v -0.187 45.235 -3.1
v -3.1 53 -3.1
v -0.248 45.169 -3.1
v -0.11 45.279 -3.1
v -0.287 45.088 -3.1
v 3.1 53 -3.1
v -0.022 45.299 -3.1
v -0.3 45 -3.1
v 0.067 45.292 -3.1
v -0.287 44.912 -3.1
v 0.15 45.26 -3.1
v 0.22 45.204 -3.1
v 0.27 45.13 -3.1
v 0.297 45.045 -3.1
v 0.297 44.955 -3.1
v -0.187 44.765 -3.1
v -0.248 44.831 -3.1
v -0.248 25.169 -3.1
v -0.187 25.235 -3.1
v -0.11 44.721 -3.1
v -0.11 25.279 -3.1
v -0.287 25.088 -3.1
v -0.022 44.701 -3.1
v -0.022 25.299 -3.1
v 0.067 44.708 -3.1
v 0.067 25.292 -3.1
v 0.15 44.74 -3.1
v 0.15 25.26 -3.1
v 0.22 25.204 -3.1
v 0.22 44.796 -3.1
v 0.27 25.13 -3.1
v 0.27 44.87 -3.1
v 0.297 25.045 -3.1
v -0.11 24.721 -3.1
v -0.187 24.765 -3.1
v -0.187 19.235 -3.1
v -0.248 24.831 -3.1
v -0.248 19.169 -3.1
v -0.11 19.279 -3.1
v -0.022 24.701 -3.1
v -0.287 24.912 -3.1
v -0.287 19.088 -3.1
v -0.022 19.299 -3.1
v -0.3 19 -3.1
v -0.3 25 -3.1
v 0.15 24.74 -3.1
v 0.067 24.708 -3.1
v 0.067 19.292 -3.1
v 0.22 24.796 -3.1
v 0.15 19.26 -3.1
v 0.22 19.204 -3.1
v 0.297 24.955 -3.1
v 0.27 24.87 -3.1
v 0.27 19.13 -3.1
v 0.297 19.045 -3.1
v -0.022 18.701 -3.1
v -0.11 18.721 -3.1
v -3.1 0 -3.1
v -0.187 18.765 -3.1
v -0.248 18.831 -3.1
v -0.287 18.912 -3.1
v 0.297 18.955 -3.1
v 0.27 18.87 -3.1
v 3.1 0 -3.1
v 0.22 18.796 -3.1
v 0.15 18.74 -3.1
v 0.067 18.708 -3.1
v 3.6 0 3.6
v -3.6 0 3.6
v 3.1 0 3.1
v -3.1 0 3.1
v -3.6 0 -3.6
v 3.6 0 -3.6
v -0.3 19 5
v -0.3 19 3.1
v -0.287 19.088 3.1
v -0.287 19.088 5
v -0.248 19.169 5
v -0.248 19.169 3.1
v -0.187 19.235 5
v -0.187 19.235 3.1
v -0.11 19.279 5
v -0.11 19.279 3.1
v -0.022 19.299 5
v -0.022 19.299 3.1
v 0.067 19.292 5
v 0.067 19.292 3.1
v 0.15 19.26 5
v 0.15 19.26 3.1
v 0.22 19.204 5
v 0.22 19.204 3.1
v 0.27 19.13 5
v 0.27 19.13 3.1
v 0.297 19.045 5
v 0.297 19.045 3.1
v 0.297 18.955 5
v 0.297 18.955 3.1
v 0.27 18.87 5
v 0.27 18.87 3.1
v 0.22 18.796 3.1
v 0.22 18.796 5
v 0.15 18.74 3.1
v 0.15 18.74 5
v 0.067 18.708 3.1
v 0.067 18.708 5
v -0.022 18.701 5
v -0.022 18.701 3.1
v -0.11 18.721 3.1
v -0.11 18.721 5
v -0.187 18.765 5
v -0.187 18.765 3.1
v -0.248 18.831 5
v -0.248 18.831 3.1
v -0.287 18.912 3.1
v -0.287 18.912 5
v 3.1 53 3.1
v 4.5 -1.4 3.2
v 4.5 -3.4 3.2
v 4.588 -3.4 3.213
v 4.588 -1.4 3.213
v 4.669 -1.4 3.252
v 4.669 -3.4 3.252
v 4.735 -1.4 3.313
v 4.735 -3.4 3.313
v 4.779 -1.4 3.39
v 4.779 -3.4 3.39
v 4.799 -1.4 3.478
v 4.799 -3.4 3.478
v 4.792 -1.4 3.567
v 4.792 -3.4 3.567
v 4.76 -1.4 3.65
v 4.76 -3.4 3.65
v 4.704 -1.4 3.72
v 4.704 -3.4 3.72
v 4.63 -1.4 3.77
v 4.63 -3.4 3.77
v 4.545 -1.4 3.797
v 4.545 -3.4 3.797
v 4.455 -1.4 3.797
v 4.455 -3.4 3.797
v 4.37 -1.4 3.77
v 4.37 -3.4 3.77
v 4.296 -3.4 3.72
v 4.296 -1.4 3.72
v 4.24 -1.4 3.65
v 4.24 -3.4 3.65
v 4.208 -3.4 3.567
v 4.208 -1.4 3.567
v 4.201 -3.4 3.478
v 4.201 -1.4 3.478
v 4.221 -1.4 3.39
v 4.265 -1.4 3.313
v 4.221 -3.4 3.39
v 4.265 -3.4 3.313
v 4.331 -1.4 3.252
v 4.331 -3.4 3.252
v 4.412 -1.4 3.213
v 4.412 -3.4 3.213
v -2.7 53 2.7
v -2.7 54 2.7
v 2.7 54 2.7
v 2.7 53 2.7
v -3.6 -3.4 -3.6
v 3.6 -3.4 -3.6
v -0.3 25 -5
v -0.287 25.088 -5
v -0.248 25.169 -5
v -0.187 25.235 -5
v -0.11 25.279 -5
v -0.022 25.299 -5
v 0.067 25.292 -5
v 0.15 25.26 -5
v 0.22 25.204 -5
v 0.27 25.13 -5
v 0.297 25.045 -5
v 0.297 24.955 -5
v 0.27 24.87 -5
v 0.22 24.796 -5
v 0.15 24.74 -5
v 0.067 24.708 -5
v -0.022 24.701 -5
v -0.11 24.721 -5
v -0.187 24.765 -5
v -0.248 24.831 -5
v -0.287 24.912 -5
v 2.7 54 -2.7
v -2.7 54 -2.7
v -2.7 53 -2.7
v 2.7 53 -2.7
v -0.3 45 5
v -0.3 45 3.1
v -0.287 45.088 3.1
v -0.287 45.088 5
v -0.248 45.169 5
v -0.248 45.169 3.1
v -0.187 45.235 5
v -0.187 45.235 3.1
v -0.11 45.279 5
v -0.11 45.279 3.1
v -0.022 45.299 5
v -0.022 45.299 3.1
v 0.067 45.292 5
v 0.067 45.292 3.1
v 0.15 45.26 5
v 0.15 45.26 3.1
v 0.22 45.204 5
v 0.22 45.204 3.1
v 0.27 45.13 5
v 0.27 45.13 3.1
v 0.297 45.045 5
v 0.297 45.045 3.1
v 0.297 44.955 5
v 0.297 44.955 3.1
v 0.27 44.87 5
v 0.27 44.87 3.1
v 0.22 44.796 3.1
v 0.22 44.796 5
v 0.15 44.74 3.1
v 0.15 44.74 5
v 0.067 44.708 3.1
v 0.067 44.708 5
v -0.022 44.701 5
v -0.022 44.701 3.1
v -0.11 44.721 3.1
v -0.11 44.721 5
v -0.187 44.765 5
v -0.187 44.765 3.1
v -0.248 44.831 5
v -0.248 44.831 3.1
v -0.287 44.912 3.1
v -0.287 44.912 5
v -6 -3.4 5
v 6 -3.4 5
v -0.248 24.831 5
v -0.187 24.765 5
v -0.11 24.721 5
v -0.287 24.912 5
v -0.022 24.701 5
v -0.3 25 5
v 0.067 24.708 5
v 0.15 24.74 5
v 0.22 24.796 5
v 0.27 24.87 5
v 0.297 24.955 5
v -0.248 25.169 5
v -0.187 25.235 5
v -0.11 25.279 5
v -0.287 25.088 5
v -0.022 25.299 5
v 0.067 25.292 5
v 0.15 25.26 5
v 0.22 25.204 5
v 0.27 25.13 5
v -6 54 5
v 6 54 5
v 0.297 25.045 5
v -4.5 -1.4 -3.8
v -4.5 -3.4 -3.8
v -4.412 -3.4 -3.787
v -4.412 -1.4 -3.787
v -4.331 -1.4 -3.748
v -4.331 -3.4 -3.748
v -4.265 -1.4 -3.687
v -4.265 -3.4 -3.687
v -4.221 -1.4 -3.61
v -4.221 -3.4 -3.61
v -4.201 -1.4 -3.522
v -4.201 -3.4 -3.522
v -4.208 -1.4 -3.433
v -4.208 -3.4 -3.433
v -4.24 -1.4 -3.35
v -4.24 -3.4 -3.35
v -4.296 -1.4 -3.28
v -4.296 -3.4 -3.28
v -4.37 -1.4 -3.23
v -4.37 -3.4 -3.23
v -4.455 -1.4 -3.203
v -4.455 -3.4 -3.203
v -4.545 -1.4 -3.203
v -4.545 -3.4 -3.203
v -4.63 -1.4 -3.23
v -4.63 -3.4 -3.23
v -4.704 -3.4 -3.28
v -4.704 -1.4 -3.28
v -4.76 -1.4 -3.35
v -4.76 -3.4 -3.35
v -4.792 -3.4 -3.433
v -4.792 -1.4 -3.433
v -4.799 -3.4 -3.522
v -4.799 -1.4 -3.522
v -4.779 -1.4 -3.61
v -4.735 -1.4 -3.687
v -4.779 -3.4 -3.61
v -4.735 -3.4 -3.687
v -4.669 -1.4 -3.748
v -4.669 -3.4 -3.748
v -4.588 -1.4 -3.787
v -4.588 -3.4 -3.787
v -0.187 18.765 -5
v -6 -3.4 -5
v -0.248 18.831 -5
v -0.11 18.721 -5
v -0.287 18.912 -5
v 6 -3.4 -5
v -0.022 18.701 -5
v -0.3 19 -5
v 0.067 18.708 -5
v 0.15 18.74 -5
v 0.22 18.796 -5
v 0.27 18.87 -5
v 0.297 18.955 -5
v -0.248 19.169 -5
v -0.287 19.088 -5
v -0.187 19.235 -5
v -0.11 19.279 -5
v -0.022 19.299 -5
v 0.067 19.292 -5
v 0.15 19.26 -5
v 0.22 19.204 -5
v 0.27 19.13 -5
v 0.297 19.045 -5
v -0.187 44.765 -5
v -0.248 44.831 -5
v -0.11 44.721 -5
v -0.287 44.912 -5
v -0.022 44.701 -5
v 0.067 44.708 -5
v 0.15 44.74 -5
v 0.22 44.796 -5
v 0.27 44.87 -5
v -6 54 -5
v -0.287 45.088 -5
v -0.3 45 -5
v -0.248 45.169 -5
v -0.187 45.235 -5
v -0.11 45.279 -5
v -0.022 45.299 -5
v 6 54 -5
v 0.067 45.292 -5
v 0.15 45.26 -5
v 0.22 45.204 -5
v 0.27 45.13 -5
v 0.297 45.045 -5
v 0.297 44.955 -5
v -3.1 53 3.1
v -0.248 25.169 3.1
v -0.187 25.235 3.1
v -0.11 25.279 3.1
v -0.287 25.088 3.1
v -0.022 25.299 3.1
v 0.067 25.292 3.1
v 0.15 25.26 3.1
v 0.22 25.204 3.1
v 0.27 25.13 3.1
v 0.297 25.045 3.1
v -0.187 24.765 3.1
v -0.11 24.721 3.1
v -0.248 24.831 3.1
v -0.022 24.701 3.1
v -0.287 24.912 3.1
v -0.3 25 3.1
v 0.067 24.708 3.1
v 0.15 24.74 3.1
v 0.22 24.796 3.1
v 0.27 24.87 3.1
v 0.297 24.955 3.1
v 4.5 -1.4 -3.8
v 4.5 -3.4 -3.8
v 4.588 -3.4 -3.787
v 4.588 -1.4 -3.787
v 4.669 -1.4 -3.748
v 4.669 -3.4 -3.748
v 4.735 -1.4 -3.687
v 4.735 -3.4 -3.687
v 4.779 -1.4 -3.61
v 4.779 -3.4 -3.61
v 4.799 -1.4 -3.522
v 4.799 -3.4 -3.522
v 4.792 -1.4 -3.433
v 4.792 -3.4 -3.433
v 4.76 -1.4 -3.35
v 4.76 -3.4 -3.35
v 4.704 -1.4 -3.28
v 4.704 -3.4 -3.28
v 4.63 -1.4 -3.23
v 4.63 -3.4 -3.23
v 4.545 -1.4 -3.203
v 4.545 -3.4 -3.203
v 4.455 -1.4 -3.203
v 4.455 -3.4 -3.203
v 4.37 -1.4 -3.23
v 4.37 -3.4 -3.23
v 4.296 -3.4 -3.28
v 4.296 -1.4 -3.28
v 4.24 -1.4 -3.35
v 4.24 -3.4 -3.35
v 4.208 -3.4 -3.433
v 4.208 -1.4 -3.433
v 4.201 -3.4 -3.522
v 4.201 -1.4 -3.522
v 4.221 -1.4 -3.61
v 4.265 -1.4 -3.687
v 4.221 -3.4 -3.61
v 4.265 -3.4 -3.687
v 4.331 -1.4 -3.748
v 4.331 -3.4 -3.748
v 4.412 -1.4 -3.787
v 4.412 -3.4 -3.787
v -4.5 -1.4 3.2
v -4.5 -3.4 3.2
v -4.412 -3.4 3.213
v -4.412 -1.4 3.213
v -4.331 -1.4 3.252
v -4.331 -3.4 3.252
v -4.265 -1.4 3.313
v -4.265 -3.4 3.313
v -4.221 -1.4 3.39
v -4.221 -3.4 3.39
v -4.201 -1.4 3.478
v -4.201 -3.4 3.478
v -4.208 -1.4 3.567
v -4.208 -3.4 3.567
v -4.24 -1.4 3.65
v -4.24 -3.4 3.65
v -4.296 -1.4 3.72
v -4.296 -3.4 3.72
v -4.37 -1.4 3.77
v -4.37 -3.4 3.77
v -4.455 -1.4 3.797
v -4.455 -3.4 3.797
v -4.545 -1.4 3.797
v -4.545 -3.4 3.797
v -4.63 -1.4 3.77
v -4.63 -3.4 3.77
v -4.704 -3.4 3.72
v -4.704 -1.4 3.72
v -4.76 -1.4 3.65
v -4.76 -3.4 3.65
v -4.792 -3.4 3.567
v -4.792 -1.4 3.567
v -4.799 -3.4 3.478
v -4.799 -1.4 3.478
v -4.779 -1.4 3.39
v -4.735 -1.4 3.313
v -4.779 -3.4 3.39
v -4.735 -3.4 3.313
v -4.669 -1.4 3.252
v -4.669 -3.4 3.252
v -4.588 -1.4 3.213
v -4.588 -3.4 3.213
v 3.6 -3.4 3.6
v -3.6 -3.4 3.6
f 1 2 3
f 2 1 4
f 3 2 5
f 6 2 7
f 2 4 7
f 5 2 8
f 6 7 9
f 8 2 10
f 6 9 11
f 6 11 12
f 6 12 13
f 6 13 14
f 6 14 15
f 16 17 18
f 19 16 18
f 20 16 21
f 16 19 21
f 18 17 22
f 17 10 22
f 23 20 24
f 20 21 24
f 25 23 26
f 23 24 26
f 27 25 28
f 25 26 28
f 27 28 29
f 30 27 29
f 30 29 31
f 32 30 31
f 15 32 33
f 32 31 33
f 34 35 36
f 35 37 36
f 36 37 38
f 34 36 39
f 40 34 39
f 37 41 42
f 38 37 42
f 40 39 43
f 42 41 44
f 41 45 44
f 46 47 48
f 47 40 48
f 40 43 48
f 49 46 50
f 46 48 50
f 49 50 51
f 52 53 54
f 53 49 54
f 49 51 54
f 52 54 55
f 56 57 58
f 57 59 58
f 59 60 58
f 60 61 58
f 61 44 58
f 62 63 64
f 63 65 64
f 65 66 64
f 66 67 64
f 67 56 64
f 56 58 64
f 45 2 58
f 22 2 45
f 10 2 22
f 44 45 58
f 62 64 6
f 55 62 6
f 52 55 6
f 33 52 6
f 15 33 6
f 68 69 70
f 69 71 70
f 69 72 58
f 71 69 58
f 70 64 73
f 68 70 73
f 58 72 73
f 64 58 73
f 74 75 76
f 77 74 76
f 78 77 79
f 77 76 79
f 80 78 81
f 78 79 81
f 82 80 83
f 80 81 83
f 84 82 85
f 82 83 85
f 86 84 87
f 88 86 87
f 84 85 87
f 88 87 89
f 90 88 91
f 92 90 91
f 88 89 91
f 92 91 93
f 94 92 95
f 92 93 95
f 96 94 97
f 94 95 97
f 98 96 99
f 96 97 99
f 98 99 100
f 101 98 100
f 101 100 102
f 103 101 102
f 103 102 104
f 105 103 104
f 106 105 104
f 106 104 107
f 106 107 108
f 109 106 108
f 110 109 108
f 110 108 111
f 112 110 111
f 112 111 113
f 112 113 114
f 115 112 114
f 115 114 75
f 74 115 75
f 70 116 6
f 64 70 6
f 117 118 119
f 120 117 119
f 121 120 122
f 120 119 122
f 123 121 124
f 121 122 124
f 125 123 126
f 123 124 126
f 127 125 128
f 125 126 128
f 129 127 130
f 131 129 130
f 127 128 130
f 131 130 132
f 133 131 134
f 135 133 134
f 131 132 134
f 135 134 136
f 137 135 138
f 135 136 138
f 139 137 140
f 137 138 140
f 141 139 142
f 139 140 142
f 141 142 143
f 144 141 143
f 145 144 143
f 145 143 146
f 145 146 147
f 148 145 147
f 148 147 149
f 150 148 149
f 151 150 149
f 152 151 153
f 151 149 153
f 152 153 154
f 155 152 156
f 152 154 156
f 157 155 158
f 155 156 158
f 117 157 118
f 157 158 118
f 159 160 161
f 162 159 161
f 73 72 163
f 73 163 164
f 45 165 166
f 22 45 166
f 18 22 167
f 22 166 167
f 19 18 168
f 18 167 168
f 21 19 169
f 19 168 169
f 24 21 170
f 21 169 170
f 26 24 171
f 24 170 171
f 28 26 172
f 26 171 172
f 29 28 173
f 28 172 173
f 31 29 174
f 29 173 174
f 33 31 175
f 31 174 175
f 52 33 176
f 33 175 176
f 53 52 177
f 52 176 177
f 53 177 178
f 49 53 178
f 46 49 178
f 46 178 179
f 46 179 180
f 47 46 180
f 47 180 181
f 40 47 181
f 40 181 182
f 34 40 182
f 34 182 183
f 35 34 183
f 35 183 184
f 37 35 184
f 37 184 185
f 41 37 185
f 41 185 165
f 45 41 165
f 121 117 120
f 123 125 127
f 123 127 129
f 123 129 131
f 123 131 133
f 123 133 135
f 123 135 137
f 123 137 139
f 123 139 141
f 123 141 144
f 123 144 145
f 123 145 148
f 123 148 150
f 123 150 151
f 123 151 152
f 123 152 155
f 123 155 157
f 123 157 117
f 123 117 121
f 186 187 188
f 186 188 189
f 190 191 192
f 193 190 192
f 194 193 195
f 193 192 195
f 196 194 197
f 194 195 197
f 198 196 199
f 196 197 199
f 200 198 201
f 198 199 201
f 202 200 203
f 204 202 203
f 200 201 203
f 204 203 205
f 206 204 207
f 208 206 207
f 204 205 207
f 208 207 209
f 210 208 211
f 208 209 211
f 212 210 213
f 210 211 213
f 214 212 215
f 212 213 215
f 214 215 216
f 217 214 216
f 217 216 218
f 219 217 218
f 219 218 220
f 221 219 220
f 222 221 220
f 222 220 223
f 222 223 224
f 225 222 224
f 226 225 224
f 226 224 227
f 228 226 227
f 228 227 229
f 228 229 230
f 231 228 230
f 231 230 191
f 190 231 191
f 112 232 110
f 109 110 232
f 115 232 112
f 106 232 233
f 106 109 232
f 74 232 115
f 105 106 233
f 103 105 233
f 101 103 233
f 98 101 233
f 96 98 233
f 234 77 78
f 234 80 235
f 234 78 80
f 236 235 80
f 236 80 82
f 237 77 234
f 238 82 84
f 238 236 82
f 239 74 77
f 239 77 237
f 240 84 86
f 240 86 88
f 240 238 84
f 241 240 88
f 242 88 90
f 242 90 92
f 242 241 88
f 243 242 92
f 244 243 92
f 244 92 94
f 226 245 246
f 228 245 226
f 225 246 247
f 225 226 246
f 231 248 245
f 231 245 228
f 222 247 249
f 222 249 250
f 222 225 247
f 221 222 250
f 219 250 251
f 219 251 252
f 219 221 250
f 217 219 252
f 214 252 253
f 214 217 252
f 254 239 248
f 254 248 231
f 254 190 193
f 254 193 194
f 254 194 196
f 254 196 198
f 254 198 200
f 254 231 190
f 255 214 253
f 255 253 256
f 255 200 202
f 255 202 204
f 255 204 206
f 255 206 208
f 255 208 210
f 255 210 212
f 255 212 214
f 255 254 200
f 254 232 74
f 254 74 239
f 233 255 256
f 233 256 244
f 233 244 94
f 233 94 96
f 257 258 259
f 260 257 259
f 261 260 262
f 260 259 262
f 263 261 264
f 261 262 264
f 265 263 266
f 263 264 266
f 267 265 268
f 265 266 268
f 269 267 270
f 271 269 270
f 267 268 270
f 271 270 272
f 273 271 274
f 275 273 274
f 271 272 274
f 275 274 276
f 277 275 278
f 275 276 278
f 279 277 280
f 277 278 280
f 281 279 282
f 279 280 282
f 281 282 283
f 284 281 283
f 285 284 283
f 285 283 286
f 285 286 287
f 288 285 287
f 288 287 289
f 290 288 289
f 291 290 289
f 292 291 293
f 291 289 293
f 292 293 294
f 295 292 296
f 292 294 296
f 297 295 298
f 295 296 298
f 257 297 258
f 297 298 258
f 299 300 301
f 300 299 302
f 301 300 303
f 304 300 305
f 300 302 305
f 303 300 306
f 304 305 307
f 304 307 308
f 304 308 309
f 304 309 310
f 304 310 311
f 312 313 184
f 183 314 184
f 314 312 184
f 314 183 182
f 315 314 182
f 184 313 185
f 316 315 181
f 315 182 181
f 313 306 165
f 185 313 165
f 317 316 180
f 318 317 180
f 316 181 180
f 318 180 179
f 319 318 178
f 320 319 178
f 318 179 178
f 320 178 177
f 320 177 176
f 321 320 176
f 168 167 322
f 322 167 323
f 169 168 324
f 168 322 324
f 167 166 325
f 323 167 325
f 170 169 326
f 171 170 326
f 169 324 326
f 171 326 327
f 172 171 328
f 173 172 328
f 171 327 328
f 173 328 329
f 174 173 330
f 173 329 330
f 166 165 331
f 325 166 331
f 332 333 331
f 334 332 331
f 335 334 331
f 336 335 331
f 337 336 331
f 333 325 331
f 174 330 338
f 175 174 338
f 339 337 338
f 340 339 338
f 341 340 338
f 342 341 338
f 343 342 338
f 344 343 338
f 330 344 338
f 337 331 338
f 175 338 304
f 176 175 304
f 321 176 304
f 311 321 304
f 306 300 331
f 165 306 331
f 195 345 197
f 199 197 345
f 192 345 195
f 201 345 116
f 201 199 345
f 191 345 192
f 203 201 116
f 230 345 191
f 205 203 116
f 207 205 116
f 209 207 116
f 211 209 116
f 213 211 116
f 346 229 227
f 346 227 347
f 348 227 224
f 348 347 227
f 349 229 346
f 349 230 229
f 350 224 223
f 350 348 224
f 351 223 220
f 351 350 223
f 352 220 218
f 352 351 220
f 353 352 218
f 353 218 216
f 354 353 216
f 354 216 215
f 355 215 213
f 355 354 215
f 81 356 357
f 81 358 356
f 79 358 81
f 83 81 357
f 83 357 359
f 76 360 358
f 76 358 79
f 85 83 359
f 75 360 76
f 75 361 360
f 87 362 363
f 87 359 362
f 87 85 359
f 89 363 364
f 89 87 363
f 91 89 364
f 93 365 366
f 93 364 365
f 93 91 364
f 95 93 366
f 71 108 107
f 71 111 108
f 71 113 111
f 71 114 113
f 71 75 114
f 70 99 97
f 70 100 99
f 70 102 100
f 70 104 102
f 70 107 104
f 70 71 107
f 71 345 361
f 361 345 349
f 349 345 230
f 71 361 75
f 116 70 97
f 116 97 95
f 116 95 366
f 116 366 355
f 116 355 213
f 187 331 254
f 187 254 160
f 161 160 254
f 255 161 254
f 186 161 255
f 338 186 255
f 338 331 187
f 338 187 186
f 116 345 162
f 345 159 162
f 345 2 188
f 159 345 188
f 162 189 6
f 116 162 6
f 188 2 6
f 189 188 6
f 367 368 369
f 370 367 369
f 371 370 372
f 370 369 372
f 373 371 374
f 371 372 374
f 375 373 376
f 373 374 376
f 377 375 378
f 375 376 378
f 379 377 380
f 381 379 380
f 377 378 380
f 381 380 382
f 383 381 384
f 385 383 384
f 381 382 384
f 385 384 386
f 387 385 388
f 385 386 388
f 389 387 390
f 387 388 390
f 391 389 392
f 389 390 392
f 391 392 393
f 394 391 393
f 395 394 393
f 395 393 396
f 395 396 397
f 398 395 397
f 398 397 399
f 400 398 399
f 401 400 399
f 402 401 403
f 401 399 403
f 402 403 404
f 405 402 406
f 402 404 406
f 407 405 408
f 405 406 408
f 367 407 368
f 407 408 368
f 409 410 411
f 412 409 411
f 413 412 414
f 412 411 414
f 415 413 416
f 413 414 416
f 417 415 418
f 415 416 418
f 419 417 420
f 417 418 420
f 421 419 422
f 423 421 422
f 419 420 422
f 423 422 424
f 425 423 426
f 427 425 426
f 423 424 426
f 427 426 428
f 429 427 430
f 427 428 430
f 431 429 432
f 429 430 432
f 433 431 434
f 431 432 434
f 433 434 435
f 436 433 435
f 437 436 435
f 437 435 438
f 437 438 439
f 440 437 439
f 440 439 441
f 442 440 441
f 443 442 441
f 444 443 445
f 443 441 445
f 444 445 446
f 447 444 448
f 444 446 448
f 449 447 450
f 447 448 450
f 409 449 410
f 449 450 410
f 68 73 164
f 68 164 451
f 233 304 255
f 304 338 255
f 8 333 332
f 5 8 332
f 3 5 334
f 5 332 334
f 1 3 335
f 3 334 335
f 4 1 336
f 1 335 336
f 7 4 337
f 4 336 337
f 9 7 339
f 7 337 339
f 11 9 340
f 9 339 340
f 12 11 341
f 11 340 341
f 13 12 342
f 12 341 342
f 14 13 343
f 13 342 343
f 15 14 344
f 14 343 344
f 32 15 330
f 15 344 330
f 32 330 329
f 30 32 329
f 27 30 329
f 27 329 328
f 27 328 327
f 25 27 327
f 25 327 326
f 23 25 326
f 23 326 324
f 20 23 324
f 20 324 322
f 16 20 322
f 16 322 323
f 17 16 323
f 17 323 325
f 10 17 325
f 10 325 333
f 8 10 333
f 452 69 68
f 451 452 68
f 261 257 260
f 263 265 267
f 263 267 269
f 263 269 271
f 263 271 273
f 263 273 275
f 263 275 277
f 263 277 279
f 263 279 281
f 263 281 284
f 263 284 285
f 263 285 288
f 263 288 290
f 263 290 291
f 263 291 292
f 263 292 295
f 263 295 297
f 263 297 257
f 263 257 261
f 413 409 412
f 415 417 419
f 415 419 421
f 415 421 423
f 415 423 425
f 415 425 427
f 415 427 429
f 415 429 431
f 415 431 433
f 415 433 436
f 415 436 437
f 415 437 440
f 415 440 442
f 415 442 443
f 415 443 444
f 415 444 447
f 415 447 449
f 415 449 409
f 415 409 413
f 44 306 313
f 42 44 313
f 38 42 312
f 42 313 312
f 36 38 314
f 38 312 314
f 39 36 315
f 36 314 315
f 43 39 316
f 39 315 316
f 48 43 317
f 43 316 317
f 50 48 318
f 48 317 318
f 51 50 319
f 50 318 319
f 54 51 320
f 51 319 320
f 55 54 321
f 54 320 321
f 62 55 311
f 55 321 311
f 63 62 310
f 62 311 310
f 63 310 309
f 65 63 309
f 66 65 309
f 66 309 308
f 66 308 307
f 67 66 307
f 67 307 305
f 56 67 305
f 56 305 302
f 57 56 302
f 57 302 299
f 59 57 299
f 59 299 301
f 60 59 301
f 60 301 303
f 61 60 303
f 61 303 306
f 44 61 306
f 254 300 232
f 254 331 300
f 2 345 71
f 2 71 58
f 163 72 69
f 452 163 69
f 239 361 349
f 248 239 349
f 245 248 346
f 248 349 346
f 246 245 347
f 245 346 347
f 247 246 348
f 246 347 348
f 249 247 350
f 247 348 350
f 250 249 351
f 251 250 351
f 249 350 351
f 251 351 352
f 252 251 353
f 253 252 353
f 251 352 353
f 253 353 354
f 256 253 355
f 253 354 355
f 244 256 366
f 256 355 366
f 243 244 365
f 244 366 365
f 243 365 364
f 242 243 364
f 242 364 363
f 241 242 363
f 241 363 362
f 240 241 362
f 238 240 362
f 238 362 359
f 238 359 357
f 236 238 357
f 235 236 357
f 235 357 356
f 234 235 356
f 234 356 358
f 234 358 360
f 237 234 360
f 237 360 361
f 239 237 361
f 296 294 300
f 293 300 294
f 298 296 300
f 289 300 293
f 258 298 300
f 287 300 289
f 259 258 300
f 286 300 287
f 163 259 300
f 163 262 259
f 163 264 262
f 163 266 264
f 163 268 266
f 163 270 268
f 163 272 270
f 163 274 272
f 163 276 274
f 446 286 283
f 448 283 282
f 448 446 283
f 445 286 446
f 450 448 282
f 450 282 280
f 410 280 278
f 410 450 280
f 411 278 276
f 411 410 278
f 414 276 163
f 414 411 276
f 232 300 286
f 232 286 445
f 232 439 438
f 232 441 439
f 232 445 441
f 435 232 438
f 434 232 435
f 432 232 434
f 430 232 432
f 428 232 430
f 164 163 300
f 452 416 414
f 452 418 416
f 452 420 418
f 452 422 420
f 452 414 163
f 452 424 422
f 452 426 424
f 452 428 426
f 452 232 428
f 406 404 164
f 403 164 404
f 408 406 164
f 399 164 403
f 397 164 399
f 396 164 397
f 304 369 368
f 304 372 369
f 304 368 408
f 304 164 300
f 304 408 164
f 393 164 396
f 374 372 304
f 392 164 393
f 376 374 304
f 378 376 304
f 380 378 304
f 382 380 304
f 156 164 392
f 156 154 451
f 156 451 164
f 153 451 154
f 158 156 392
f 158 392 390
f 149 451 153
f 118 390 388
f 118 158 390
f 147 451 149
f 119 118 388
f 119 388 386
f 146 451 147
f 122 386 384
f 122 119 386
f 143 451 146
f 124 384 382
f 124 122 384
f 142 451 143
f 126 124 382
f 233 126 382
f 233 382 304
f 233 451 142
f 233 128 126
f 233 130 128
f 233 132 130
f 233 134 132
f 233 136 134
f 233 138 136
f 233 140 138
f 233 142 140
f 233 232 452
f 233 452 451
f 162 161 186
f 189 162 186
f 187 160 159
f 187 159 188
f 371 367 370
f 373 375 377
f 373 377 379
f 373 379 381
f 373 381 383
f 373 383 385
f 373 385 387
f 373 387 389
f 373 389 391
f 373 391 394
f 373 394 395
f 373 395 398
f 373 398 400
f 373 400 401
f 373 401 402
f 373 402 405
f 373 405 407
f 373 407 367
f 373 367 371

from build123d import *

# Parameters (mm, degrees)
SKETCH_1_W          = 12
SKETCH_1_H          = 10
SKETCH_1_W_2        = 6.2
SKETCH_1_H_2        = 6.2
EXTRUDE_1_DEPTH     = 54
EXTRUDE_START       = 54
SKETCH_1_3_W        = 12
SKETCH_1_3_H        = 10
SKETCH_1_3_W_2      = 6.2
SKETCH_1_3_H_2      = 6.2
SKETCH_1_3_W_3      = 5.4
SKETCH_1_3_H_3      = 5.4
EXTRUDE_2_DEPTH     = 1
SKETCH_3_W          = 12
SKETCH_3_H          = 10
SKETCH_3_W_2        = 7.2
SKETCH_3_H_2        = 7.2
EXTRUDE_3_DEPTH     = 3.4
SKETCH_2_R          = 0.3
CUT_EXTRUDE_1_DEPTH = 2
SKETCH_7_R          = 0.3
CUT_EXTRUDE_2_DEPTH = 56.244909268


with BuildPart() as part:
    # 草图1 → 凸台-拉伸1 (new body)
    with BuildSketch(Plane(origin=(0, 0, 0), x_dir=(1, 0, 0), z_dir=(0, 1, 0))):
        Rectangle(SKETCH_1_W, SKETCH_1_H)
        Rectangle(SKETCH_1_W_2, SKETCH_1_H_2, mode=Mode.SUBTRACT)
    extrude(amount=EXTRUDE_1_DEPTH)

    # 草图1<3> → 凸台-拉伸2 (add)
    # profile 1 of 2: a face of its own
    with BuildSketch(Plane(origin=(0, 0, 0), x_dir=(1, 0, 0), z_dir=(0, 1, 0)).offset(EXTRUDE_START)):
        Rectangle(SKETCH_1_3_W, SKETCH_1_3_H)
        Rectangle(SKETCH_1_3_W_2, SKETCH_1_3_H_2, mode=Mode.SUBTRACT)
    # profile 2 of 2: a face of its own
    with BuildSketch(Plane(origin=(0, 0, 0), x_dir=(1, 0, 0), z_dir=(0, 1, 0)).offset(EXTRUDE_START)):
        Rectangle(SKETCH_1_3_W_2, SKETCH_1_3_H_2)
        Rectangle(SKETCH_1_3_W_3, SKETCH_1_3_H_3, mode=Mode.SUBTRACT)
    extrude(amount=-EXTRUDE_2_DEPTH)

    # 草图3 → 凸台-拉伸3 (add)
    with BuildSketch(Plane.XZ):
        Rectangle(SKETCH_3_W, SKETCH_3_H)
        Rectangle(SKETCH_3_W_2, SKETCH_3_H_2, mode=Mode.SUBTRACT)
    extrude(amount=EXTRUDE_3_DEPTH)

    # 草图2 → 切除-拉伸1 (cut)
    with BuildSketch(Plane.XZ.offset(3.4)):
        with Locations(Location((-4.5, 3.5, 0), (0, 0, 270))):
            Circle(SKETCH_2_R)
        with Locations(Location((4.5, -3.5, 0), (0, 0, 270))):
            Circle(SKETCH_2_R)
        with Locations(Location((4.5, 3.5, 0), (0, 0, 270))):
            Circle(SKETCH_2_R)
        with Locations(Location((-4.5, -3.5, 0), (0, 0, 270))):
            Circle(SKETCH_2_R)
    extrude(amount=-CUT_EXTRUDE_1_DEPTH, mode=Mode.SUBTRACT)

    # 草图7 → 切除-拉伸2 (cut, through all)
    with BuildSketch(Plane(origin=(0, 0, -5), x_dir=(-1, 0, 0), z_dir=(0, 0, -1))):
        with Locations((0, 19)):
            Circle(SKETCH_7_R)
        with Locations((0, 25)):
            Circle(SKETCH_7_R)
        with Locations((0, 45)):
            Circle(SKETCH_7_R)
    extrude(amount=-CUT_EXTRUDE_2_DEPTH, mode=Mode.SUBTRACT)


solid = part.part
